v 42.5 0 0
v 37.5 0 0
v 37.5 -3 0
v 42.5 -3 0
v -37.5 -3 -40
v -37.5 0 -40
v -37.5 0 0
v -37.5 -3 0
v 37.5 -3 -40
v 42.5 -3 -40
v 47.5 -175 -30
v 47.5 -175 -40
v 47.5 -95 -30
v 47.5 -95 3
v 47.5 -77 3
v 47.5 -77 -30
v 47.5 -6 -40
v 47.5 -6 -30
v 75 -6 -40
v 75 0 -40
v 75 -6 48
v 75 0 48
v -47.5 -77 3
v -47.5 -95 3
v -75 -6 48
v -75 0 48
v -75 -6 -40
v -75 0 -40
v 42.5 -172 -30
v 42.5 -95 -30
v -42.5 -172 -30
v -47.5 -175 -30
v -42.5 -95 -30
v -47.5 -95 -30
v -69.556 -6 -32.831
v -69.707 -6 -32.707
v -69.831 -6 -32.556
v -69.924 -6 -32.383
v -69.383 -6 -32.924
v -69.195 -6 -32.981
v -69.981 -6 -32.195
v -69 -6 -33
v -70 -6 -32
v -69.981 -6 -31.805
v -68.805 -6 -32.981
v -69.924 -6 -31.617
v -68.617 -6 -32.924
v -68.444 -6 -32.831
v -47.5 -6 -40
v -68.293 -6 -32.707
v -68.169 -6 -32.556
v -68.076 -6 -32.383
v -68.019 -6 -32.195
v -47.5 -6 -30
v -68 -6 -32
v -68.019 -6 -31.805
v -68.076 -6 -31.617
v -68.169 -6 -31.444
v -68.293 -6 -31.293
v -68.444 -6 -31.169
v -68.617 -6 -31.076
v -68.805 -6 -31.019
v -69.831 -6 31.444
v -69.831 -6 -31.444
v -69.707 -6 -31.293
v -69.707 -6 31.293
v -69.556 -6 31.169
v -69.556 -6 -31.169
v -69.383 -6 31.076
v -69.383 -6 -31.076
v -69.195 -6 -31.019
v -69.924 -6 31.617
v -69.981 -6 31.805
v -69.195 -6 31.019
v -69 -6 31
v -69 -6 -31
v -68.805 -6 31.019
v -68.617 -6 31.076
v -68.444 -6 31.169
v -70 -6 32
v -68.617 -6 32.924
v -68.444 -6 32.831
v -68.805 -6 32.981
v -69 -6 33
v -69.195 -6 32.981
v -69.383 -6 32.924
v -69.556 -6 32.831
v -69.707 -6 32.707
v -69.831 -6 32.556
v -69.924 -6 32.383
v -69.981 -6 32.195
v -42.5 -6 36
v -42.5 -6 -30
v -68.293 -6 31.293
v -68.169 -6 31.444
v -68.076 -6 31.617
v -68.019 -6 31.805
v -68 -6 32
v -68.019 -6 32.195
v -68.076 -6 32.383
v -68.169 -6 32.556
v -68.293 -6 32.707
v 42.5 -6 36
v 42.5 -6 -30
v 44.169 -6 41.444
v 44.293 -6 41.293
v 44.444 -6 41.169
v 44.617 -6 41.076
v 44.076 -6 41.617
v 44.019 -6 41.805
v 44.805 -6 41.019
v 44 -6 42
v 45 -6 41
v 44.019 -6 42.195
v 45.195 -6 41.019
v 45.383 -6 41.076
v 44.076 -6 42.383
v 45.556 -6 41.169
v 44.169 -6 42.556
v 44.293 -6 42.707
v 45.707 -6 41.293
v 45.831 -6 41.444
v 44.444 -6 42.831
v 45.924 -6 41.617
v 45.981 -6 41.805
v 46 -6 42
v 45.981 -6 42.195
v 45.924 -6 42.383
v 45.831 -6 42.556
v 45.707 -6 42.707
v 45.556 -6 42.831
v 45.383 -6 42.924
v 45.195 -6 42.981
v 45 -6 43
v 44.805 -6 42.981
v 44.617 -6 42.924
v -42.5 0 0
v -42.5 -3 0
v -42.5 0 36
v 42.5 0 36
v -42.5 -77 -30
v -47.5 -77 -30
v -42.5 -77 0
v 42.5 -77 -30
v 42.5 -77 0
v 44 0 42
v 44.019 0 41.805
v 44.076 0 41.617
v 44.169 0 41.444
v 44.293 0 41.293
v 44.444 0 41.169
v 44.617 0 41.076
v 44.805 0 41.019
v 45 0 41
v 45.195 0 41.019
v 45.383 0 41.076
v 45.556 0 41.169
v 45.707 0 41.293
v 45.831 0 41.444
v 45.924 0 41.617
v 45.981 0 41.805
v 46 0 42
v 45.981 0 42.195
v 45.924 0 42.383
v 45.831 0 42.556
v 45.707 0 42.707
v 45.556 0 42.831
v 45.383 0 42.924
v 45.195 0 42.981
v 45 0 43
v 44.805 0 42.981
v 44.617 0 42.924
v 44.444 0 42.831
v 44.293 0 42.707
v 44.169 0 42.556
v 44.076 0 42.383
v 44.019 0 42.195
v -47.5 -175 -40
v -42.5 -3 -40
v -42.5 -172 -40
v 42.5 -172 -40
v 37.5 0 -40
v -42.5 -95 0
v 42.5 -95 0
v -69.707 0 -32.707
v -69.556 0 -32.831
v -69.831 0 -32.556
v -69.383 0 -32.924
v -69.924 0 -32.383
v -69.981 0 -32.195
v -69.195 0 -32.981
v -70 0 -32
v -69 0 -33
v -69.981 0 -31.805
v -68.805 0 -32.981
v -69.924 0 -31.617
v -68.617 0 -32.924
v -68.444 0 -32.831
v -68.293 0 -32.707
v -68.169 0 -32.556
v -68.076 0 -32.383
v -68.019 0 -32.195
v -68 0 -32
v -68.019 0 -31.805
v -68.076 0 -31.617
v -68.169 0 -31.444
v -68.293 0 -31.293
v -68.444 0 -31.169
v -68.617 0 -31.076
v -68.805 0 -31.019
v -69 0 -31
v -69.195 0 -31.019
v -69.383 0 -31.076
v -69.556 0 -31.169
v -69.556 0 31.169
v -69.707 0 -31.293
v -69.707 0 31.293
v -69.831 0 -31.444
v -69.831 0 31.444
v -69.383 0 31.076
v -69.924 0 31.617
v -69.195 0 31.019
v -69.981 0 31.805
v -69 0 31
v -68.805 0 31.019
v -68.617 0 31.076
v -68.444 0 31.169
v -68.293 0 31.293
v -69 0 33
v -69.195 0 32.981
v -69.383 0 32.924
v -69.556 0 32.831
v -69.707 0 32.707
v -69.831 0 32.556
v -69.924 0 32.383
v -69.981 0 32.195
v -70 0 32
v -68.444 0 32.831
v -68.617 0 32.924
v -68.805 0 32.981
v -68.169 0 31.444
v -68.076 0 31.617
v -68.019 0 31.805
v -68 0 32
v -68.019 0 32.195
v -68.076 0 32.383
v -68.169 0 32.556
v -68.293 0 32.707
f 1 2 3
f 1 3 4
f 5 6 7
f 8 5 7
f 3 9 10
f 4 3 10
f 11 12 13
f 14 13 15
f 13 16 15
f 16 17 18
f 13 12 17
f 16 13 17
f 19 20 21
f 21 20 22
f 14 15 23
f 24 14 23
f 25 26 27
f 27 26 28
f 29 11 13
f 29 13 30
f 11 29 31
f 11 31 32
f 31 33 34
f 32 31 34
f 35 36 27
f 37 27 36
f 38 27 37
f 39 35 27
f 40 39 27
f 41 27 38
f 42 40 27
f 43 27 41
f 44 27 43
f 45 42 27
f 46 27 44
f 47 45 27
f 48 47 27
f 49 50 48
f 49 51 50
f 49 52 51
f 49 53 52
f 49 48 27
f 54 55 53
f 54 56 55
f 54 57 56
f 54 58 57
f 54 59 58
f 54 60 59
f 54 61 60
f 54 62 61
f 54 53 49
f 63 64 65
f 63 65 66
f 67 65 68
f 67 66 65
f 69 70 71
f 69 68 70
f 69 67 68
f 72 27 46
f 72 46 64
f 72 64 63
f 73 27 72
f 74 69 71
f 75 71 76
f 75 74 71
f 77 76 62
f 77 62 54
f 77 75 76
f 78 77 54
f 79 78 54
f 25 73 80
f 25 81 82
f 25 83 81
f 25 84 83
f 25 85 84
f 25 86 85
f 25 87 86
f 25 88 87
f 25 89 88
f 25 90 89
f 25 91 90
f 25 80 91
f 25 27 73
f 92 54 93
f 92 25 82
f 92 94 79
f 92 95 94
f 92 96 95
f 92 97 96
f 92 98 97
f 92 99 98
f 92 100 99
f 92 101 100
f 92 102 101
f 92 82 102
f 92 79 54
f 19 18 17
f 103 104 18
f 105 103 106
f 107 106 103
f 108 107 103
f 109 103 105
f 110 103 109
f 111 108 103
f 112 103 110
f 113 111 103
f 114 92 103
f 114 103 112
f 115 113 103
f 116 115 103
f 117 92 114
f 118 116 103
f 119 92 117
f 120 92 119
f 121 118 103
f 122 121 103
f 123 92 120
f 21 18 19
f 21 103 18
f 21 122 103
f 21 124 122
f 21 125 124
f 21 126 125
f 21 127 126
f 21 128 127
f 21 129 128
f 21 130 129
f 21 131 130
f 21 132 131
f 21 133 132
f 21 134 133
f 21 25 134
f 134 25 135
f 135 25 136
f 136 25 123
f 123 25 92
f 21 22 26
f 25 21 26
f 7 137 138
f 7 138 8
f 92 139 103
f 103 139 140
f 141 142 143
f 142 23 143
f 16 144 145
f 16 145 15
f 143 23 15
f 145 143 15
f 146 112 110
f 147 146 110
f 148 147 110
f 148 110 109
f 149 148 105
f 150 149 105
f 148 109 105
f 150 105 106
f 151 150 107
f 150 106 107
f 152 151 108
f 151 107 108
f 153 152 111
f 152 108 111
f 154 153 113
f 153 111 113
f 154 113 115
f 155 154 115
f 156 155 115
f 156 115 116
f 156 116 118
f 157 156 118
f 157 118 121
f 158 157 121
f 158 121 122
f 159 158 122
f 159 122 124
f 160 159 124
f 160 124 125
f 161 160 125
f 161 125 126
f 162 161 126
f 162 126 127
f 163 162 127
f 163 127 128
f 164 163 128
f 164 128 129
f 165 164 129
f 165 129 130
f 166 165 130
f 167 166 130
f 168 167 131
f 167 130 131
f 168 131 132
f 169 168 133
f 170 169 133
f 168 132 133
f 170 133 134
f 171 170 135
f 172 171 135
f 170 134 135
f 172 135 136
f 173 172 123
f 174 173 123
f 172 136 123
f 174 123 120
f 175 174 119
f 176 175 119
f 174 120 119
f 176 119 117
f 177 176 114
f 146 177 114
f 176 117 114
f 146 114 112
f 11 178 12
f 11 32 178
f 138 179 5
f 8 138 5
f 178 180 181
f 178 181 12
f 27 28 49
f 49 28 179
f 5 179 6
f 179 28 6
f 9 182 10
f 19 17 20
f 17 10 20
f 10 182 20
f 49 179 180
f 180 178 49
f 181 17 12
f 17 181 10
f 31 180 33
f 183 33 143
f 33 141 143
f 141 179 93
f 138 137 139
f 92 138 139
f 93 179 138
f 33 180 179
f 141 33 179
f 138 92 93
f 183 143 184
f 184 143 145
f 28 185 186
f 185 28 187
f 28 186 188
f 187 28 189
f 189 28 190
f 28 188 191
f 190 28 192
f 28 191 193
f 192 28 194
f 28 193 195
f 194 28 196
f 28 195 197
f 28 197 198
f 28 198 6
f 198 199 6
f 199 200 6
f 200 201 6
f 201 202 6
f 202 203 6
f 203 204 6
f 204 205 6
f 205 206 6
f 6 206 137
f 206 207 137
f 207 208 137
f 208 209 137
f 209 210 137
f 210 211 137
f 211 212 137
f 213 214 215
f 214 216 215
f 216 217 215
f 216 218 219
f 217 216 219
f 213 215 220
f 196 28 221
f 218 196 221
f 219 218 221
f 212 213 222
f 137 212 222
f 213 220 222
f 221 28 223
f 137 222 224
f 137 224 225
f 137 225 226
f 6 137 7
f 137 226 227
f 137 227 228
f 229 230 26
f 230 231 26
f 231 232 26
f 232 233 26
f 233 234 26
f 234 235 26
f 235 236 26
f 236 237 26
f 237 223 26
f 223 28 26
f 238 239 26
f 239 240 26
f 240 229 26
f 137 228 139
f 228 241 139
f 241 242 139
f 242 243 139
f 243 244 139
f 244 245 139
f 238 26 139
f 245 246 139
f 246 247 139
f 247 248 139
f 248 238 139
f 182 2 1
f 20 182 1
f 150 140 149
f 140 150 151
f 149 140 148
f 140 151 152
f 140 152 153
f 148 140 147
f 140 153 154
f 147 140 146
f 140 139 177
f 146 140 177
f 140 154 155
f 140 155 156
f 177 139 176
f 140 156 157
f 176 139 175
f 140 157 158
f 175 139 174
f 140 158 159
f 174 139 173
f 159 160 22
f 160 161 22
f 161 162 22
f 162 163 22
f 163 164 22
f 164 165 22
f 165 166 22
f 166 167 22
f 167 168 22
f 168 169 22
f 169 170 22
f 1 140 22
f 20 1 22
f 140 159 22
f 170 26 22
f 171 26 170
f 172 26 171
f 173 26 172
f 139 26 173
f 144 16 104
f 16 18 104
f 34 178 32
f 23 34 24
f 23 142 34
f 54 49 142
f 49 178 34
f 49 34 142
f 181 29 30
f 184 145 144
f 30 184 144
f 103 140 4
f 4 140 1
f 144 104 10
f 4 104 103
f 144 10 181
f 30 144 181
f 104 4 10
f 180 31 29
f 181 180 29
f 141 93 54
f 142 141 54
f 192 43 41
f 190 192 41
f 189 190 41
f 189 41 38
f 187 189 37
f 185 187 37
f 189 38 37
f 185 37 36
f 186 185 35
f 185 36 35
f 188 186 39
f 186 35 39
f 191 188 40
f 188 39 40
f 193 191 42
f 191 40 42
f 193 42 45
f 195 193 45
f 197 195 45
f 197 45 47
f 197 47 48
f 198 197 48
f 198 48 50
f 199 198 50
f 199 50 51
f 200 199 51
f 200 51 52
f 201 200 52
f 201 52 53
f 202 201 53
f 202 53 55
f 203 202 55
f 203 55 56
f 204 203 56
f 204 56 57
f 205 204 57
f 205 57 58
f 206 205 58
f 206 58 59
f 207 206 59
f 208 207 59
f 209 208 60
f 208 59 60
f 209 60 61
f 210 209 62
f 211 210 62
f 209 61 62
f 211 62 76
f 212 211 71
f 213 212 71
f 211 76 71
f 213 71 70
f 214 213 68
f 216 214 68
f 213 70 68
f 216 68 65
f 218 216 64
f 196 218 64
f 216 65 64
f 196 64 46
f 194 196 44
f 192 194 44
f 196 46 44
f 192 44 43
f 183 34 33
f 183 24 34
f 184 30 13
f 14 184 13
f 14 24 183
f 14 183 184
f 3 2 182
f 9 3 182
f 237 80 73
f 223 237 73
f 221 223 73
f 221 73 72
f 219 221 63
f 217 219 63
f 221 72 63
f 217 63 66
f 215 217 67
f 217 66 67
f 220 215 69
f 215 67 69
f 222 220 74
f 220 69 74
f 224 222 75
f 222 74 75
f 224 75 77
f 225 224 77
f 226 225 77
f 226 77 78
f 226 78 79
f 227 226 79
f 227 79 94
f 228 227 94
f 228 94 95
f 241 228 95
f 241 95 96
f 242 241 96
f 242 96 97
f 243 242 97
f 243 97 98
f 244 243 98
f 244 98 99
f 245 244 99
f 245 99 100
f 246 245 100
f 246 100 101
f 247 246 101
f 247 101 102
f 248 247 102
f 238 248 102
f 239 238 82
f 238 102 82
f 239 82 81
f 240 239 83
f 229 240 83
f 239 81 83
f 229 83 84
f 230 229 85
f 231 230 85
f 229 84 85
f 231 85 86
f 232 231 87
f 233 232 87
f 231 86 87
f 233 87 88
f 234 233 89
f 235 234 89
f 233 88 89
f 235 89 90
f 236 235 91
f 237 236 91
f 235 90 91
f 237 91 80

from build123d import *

# Parameters (mm, degrees)
F0_W     = 5
F0_H     = 3
F0_H_2   = 30
F1_DEPTH = 6
F0_H_3   = 10
F2_DEPTH = 175
F3_DEPTH = 3
F4_START = 172
F0_W_2   = 75
F4_DEPTH = 3
F5_START = 77
F5_DEPTH = 18
F6_D     = 2


# Not quite as in the source:
# - a feature names something its author has since deleted; it is built from what else it names


with BuildPart() as f1:
    # F0 (on Front) → F1 (new body)
    with BuildSketch(Plane.XZ):
        Polygon((75, 48), (-75, 48), (-75, -40), (-47.5, -40), (-47.5, -30), (-47.5, 0), (-47.5, 3), (-42.5, 3), (-42.5, 36), (42.5, 36), (75, 36), align=None)
        Polygon((75, -40), (75, 36), (42.5, 36), (42.5, 3), (47.5, 3), (47.5, 0), (47.5, -30), (47.5, -40), align=None)
        with Locations((45, 1.5)):
            Rectangle(F0_W, F0_H)
        with Locations((45, -15)):
            Rectangle(F0_W, F0_H_2)
        with Locations((-45, 1.5)):
            Rectangle(F0_W, F0_H)
        with Locations((-45, -15)):
            Rectangle(F0_W, F0_H_2)
    extrude(amount=F1_DEPTH)

    # F0 (on Front) → F2 (join)
    with BuildSketch(Plane.XZ):
        with Locations((-45, -35)):
            Rectangle(F0_W, F0_H_3)
        with Locations((45, -35)):
            Rectangle(F0_W, F0_H_3)
    extrude(amount=F2_DEPTH)

    # F0 (on Front) → F3 (join)
    with BuildSketch(Plane.XZ):
        with Locations((-40, -15)):
            Rectangle(F0_W, F0_H_2)
        with Locations((-40, -35)):
            Rectangle(F0_W, F0_H_3)
        with Locations((40, -35)):
            Rectangle(F0_W, F0_H_3)
        with Locations((40, -15)):
            Rectangle(F0_W, F0_H_2)
    extrude(amount=F3_DEPTH)

    # F0 (on Front) → F4 (join)
    with BuildSketch(Plane.XZ.offset(F4_START)):
        with Locations((-40, -35)):
            Rectangle(F0_W, F0_H_3)
        with Locations((40, -35)):
            Rectangle(F0_W, F0_H_3)
        with Locations((0, -35)):
            Rectangle(F0_W_2, F0_H_3)
    extrude(amount=F4_DEPTH)

    # F0 (on Front) → F5 (join)
    with BuildSketch(Plane.XZ.offset(F5_START)):
        with Locations((-45, -15)):
            Rectangle(F0_W, F0_H_2)
        with Locations((45, -15)):
            Rectangle(F0_W, F0_H_2)
        Polygon((42.5, 0), (42.5, 3), (-42.5, 3), (-42.5, 0), (-37.5, 0), (37.5, 0), align=None)
        with Locations((45, 1.5)):
            Rectangle(F0_W, F0_H)
        with Locations((-45, 1.5)):
            Rectangle(F0_W, F0_H)
    extrude(amount=F5_DEPTH)

    # F6 (through all)
    with Locations(Plane(origin=(0, 0, 0), x_dir=(1, 0, 0), z_dir=(0, 1, 0))):
        with Locations((45, -42), (-69, -32), (-69, 32)):
            Hole(F6_D / 2)


solid = f1.part
